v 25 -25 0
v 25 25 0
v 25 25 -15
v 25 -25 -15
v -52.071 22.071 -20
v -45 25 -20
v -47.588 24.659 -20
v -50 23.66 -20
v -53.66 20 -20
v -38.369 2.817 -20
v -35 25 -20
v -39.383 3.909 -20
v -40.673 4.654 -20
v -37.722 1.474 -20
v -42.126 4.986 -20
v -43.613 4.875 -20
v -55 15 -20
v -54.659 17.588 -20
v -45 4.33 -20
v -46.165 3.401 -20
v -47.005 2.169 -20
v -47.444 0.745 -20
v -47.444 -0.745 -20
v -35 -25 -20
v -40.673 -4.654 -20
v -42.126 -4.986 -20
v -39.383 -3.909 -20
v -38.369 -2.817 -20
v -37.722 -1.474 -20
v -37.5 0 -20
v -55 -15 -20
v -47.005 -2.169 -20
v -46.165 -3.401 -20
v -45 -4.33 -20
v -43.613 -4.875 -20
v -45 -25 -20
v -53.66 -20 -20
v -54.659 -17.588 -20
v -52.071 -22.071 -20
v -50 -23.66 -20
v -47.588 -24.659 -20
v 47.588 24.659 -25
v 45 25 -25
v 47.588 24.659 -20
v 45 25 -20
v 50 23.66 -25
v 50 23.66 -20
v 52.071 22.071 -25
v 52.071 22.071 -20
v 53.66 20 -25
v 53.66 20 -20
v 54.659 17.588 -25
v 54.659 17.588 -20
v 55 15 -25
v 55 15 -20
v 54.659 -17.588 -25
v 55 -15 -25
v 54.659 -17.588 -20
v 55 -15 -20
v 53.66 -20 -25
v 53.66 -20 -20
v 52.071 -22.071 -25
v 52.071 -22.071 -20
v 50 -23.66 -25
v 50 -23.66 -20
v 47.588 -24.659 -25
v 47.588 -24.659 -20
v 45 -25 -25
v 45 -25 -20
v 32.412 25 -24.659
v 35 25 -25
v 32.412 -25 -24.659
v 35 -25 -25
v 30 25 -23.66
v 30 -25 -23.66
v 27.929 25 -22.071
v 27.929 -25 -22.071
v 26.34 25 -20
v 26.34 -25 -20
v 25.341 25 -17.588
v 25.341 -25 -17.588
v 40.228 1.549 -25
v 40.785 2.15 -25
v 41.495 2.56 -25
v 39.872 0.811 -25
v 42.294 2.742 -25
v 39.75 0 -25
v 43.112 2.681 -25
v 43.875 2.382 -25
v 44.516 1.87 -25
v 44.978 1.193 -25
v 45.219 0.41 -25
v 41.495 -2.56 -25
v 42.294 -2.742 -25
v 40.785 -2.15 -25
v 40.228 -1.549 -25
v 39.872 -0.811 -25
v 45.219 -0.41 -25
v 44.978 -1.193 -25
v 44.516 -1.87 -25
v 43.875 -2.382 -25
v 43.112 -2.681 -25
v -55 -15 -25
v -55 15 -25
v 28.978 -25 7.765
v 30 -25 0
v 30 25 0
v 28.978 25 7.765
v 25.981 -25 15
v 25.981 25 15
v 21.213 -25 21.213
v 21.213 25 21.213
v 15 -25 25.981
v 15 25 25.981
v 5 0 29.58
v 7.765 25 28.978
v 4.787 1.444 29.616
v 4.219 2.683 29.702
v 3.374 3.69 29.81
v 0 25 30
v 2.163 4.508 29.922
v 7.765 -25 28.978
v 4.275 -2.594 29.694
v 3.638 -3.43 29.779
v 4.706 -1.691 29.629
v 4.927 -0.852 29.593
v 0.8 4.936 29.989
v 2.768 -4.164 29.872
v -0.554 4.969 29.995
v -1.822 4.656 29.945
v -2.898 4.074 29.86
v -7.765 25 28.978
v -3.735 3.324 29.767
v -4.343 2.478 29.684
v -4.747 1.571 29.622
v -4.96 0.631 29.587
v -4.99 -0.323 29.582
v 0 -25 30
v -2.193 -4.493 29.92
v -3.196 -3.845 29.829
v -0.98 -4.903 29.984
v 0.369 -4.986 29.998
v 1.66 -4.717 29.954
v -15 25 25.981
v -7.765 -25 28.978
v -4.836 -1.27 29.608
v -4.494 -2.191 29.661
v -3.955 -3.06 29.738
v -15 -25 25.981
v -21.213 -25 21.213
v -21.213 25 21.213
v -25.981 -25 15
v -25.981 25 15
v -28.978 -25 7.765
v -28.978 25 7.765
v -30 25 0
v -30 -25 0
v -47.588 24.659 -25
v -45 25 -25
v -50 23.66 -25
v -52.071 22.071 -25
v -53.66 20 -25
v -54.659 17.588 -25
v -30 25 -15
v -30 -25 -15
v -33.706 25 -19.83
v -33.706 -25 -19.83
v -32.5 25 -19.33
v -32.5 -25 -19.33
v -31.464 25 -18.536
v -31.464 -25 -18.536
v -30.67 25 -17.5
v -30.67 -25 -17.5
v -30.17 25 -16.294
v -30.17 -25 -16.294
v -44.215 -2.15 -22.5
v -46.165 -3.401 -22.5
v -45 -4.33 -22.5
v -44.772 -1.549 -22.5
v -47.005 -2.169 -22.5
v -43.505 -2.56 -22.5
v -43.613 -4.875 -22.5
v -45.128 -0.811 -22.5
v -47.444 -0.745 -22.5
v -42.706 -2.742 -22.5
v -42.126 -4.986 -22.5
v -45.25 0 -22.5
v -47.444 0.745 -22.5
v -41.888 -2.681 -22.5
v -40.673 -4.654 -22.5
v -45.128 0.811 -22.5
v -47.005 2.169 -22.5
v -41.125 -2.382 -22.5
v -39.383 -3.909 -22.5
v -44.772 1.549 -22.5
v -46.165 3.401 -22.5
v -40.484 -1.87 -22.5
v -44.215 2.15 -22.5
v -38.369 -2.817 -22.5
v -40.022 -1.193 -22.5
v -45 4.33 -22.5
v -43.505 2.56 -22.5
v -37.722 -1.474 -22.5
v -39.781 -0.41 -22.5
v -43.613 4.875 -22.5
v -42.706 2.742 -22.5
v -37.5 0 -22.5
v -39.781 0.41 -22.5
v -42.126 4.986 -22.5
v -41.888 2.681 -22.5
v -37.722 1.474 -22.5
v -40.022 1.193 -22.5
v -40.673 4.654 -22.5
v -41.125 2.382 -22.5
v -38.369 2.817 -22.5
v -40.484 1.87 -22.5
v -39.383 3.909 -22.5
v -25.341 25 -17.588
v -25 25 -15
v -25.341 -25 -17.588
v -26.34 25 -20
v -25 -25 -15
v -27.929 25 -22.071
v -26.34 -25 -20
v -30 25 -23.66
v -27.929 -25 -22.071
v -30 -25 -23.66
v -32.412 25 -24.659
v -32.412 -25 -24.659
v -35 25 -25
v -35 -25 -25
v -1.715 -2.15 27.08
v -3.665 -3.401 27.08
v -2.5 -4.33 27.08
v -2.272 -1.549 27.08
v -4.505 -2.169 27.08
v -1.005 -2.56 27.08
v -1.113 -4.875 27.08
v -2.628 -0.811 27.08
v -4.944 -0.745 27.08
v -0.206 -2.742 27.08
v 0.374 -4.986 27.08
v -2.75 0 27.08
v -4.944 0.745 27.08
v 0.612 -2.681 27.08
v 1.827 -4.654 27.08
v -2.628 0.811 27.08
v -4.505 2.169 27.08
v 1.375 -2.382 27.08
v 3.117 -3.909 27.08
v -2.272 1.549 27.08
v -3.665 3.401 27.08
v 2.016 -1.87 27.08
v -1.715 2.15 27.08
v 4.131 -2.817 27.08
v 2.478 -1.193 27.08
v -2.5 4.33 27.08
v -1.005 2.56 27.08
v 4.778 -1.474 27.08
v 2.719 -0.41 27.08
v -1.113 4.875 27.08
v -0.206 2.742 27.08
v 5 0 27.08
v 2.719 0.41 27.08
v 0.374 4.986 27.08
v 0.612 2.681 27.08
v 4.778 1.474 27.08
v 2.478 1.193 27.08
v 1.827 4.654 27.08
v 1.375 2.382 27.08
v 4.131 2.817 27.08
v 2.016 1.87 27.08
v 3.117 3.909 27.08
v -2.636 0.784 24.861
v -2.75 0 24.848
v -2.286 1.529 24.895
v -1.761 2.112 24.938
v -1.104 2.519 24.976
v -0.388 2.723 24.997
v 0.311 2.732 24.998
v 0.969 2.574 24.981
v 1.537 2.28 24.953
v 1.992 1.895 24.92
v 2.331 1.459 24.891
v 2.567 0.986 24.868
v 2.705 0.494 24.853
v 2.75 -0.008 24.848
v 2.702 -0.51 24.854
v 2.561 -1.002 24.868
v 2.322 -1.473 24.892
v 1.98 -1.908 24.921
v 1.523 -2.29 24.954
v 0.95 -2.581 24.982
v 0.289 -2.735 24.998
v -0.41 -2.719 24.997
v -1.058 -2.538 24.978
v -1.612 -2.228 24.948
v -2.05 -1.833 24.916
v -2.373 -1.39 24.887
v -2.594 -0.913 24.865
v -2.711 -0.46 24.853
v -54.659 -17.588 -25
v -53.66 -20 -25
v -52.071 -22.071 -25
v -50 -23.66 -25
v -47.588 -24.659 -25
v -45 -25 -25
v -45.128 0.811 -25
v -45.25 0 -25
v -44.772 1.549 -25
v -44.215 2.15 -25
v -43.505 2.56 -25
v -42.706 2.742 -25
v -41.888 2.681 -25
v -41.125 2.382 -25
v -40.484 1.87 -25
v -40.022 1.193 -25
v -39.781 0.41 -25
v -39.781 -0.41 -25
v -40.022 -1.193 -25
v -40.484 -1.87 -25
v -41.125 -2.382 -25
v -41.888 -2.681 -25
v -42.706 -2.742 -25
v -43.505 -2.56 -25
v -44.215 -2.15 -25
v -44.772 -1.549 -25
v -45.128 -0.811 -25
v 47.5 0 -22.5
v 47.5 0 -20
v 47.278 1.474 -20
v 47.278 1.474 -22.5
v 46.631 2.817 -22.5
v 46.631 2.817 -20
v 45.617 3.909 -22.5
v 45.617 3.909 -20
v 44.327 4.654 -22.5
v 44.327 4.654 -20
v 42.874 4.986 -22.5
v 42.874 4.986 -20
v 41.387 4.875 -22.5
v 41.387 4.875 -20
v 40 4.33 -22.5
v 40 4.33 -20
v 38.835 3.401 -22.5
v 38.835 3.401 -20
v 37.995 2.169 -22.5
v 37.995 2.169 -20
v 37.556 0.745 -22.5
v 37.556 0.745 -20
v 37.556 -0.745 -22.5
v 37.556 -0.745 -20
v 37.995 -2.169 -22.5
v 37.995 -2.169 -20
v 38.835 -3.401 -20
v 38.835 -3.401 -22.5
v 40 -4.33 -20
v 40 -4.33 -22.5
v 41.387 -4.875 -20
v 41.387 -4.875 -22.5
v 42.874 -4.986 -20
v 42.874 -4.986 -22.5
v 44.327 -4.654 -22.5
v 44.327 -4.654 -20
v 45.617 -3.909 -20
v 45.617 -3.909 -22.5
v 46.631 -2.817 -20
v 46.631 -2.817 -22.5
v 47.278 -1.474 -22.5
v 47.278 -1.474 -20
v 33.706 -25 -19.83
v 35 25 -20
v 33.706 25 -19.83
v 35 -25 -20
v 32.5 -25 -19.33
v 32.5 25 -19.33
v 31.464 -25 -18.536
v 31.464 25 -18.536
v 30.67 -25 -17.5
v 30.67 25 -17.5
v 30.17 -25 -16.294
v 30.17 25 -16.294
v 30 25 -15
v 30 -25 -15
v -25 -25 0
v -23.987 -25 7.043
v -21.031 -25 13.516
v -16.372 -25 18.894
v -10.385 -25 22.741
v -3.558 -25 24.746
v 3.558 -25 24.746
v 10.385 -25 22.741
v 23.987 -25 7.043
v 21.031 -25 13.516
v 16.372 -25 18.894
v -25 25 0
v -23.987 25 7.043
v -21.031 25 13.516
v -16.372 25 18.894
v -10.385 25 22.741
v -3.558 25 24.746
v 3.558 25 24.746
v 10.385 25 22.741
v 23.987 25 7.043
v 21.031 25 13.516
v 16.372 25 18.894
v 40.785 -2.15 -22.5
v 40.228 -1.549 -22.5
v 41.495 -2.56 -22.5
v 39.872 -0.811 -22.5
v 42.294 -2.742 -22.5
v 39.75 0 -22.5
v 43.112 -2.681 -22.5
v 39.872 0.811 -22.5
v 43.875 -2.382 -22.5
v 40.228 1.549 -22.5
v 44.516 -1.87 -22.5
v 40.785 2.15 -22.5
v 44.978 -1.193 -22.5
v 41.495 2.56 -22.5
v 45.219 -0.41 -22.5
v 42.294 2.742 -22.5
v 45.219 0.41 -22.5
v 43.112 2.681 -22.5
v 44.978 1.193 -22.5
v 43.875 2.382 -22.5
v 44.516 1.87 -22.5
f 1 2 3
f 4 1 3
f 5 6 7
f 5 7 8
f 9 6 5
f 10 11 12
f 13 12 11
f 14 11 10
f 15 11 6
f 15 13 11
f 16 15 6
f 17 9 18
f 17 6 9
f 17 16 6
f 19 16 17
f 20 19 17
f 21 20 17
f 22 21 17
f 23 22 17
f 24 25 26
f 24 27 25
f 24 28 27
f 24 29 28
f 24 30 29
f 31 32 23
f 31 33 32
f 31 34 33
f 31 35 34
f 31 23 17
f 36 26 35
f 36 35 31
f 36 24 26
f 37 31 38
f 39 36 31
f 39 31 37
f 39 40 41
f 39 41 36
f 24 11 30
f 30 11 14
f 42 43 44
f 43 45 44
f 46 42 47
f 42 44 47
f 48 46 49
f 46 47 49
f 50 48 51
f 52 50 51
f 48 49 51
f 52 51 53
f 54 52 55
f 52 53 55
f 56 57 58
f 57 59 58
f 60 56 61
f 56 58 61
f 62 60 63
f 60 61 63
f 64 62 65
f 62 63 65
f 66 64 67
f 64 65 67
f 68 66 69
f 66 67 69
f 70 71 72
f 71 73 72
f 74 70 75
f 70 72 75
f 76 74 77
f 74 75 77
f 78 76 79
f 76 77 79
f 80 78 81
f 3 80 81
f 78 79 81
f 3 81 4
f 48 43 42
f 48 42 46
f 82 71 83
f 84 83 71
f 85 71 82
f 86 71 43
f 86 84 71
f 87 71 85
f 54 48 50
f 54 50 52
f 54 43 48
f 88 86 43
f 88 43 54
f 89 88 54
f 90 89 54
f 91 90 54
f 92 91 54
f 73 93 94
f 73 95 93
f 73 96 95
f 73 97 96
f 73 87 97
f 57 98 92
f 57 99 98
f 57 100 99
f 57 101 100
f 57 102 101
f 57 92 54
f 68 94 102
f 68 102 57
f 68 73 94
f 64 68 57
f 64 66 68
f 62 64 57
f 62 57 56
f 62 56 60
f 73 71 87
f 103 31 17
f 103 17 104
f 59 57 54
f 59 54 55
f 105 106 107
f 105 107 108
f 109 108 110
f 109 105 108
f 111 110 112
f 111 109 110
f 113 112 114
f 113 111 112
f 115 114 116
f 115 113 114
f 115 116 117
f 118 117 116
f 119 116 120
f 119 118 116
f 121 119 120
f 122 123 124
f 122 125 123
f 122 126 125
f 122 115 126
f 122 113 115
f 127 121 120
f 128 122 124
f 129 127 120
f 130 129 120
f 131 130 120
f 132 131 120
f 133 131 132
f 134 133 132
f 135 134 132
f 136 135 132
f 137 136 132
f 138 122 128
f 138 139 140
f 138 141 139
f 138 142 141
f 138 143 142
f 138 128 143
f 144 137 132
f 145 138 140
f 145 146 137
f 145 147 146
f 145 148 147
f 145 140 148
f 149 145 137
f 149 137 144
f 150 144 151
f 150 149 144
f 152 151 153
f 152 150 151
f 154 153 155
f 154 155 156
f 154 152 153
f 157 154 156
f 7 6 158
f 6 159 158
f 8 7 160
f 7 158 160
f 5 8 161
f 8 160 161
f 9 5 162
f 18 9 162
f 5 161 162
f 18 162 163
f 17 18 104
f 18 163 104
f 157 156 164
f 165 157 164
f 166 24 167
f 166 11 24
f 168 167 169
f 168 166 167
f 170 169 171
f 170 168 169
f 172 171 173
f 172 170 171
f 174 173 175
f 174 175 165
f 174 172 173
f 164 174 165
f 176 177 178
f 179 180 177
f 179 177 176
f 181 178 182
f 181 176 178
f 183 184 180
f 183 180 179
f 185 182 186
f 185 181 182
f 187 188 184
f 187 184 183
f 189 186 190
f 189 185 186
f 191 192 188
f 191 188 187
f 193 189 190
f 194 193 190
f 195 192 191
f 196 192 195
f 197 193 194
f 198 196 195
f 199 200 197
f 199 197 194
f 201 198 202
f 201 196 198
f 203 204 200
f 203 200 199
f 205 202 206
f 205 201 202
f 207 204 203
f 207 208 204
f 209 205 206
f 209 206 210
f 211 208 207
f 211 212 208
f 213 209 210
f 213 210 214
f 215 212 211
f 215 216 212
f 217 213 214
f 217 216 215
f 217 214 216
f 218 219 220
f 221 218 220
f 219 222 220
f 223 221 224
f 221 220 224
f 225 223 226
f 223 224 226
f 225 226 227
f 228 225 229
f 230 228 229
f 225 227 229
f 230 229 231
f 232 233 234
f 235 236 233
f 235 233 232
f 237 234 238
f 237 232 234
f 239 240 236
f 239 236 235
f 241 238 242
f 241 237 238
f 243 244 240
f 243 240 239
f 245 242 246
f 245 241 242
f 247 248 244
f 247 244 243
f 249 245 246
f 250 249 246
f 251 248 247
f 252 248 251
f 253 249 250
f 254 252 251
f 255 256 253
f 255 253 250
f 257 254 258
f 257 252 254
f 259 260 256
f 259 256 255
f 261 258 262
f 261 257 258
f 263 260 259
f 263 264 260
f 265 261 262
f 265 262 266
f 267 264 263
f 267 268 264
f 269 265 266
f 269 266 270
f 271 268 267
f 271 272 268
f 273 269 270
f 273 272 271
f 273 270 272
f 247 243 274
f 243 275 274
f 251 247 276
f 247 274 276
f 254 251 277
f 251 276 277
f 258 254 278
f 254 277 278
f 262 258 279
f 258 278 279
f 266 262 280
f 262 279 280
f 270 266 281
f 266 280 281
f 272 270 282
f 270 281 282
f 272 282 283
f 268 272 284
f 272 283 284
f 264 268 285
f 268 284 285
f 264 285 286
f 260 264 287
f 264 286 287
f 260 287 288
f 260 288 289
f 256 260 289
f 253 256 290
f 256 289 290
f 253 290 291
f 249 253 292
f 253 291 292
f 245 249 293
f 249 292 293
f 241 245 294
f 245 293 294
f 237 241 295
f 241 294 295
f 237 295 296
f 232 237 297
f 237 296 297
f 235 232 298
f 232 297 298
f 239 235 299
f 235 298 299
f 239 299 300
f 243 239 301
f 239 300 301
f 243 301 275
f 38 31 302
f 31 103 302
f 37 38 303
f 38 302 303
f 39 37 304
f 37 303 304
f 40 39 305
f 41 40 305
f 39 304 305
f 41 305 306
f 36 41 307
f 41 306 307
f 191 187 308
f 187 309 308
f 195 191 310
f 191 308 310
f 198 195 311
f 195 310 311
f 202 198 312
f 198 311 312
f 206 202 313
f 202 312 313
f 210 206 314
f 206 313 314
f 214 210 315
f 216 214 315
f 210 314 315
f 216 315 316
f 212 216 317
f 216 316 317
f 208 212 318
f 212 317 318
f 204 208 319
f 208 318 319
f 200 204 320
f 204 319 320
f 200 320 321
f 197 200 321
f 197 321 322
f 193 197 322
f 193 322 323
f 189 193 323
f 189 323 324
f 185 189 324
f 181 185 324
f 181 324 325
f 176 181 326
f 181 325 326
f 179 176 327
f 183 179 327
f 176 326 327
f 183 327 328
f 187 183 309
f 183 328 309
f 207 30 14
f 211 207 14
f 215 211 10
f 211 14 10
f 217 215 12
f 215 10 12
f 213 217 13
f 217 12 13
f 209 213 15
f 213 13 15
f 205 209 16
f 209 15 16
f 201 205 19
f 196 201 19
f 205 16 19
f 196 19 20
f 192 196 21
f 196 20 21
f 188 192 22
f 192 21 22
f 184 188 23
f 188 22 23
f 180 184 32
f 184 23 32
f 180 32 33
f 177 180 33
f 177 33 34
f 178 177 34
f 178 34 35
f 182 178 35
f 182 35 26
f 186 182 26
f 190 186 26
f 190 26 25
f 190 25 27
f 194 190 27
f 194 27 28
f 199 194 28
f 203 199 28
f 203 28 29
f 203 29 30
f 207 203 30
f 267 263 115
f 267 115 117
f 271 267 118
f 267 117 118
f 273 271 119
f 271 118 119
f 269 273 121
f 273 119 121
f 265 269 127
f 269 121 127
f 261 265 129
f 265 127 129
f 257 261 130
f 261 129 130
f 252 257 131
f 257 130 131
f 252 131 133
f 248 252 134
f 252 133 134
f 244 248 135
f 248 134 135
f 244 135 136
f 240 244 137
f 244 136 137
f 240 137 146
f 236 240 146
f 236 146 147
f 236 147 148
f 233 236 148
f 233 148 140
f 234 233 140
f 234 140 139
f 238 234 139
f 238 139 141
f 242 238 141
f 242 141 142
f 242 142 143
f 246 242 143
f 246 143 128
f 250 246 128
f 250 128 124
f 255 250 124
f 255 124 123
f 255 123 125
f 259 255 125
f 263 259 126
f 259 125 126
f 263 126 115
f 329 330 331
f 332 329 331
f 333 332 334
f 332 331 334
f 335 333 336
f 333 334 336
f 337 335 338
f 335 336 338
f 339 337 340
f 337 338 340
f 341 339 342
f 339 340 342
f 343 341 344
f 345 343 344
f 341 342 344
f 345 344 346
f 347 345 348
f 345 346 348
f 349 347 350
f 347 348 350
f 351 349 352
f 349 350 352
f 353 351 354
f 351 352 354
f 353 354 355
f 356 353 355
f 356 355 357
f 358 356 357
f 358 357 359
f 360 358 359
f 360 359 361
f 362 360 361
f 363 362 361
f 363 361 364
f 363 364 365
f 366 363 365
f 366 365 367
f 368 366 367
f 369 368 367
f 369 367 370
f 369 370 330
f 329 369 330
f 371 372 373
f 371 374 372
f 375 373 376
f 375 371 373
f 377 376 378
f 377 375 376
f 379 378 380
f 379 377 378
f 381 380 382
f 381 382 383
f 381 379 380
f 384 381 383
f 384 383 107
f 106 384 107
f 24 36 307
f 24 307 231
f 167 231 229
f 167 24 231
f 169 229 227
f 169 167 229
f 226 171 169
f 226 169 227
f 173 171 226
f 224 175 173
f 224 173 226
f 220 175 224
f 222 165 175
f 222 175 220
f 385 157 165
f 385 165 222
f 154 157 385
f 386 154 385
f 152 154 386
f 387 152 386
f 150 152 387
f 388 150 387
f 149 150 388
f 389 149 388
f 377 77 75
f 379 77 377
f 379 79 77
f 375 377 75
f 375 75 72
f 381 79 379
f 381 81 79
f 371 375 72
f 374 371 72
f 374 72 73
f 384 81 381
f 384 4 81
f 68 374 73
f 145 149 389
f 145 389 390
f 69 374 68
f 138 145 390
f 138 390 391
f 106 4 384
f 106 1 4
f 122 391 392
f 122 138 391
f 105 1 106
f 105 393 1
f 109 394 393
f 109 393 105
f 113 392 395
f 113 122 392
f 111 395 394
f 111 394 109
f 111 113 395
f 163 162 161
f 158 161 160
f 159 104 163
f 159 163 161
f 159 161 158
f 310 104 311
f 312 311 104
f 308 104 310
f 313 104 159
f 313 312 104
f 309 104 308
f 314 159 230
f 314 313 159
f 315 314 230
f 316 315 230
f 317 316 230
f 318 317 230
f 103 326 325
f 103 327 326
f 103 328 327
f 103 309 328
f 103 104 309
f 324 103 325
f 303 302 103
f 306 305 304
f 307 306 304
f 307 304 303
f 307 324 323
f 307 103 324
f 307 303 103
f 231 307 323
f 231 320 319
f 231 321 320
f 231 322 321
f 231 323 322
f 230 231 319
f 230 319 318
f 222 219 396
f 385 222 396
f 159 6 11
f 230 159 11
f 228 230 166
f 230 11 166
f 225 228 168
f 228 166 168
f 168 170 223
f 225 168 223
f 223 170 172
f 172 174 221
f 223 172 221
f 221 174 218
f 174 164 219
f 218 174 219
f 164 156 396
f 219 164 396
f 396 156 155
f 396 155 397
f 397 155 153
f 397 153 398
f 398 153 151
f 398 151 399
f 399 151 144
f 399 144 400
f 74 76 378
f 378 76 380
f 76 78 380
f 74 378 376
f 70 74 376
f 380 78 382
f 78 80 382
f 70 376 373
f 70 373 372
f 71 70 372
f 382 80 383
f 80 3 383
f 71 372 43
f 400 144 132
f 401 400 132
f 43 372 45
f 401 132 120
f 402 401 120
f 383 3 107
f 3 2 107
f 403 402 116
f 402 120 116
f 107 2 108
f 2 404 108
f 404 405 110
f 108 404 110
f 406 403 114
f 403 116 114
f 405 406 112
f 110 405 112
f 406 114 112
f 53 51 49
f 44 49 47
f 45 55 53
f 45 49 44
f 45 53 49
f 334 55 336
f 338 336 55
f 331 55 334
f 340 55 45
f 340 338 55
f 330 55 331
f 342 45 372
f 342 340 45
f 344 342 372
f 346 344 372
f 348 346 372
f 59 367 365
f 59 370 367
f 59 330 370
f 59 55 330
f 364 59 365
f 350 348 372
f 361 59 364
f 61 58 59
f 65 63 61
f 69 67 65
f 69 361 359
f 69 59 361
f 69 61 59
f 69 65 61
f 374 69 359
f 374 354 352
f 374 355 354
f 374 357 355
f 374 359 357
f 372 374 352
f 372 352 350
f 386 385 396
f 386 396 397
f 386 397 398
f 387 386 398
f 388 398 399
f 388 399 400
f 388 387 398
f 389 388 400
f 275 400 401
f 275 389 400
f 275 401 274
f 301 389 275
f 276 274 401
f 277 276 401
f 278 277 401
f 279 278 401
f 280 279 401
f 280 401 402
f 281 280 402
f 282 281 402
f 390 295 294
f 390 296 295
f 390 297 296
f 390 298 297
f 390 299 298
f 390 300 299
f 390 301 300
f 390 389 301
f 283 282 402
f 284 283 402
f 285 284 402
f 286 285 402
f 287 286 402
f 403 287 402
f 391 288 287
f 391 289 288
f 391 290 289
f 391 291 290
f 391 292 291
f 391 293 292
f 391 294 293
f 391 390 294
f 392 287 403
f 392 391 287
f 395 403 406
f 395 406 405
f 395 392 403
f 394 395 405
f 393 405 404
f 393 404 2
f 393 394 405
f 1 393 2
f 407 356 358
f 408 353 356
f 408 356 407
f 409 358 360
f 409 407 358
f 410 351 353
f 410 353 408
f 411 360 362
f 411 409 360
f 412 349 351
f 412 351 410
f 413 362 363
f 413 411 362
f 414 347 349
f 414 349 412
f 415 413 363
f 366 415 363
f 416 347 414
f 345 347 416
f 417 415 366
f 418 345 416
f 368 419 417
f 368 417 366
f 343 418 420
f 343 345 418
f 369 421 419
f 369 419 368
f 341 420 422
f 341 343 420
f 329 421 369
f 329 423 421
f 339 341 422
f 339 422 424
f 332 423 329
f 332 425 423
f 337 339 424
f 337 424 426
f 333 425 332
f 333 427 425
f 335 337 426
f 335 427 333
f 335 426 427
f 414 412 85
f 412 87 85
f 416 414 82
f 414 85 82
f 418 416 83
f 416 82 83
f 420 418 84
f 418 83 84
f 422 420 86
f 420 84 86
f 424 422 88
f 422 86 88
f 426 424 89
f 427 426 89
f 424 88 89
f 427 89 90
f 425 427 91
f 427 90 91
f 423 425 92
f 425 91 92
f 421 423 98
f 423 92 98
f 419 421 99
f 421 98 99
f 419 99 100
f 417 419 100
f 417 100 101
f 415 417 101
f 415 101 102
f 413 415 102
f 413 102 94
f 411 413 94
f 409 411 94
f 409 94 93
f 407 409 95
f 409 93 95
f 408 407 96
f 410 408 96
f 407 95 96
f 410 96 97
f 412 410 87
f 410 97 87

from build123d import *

# Parameters (mm, degrees)
F1_DEPTH       = 25
F5_D           = 5.5
F5_START       = 0.4196012
F5_CBORE_D     = 10
F5_CBORE_DEPTH = 2.5
F7_D           = 5.5
F7_CBORE_D     = 10
F7_CBORE_DEPTH = 2.5
F8_R           = 5
F9_R           = 10
F10_R          = 10


with BuildPart() as f1:
    # F0 (on Front) → F1 (new body, symmetric)
    with BuildSketch(Plane.XZ):
        with BuildLine():
            Line((-55, -20), (-55, -25))
            Line((-55, -25), (-25, -25))
            Line((-25, -25), (-25, 0))
            ThreePointArc((-25, 0), (0, 25), (25, 0))
            Line((25, 0), (25, -25))
            Line((25, -25), (55, -25))
            Line((55, -25), (55, -20))
            Line((55, -20), (30, -20))
            Line((30, -20), (30, 0))
            ThreePointArc((30, 0), (0, 30), (-30, 0))
            Line((-30, 0), (-30, -20))
            Line((-30, -20), (-55, -20))
        make_face()
    extrude(amount=F1_DEPTH, both=True)

    # F5 (through all)
    # its depths count from where the whole tool has entered the part; down to there all is cleared
    with Locations(Plane.XY.offset(30).offset(-F5_START)):
        with Locations((0, 0)):
            CounterBoreHole(F5_D / 2, F5_CBORE_D / 2, F5_CBORE_DEPTH)

    # F7 (through all)
    with Locations(Plane.XY.offset(-20)):
        with Locations((-42.5, 0), (42.5, 0)):
            CounterBoreHole(F7_D / 2, F7_CBORE_D / 2, F7_CBORE_DEPTH)

    # F8
    f8_edges = [f1.edges().sort_by_distance(p)[0] for p in [
        (30, 0, -20),
        (-30, 0, -20),
    ]]
    fillet(f8_edges, radius=F8_R)

    # F9
    f9_edges = [f1.edges().sort_by_distance(p)[0] for p in [
        (25, 0, -25),
        (-25, 0, -25),
    ]]
    fillet(f9_edges, radius=F9_R)

    # F10
    f10_edges = [f1.edges().sort_by_distance(p)[0] for p in [
        (-55, -25, -22.5),
        (55, -25, -22.5),
        (55, 25, -22.5),
        (-55, 25, -22.5),
    ]]
    fillet(f10_edges, radius=F10_R)


solid = f1.part
